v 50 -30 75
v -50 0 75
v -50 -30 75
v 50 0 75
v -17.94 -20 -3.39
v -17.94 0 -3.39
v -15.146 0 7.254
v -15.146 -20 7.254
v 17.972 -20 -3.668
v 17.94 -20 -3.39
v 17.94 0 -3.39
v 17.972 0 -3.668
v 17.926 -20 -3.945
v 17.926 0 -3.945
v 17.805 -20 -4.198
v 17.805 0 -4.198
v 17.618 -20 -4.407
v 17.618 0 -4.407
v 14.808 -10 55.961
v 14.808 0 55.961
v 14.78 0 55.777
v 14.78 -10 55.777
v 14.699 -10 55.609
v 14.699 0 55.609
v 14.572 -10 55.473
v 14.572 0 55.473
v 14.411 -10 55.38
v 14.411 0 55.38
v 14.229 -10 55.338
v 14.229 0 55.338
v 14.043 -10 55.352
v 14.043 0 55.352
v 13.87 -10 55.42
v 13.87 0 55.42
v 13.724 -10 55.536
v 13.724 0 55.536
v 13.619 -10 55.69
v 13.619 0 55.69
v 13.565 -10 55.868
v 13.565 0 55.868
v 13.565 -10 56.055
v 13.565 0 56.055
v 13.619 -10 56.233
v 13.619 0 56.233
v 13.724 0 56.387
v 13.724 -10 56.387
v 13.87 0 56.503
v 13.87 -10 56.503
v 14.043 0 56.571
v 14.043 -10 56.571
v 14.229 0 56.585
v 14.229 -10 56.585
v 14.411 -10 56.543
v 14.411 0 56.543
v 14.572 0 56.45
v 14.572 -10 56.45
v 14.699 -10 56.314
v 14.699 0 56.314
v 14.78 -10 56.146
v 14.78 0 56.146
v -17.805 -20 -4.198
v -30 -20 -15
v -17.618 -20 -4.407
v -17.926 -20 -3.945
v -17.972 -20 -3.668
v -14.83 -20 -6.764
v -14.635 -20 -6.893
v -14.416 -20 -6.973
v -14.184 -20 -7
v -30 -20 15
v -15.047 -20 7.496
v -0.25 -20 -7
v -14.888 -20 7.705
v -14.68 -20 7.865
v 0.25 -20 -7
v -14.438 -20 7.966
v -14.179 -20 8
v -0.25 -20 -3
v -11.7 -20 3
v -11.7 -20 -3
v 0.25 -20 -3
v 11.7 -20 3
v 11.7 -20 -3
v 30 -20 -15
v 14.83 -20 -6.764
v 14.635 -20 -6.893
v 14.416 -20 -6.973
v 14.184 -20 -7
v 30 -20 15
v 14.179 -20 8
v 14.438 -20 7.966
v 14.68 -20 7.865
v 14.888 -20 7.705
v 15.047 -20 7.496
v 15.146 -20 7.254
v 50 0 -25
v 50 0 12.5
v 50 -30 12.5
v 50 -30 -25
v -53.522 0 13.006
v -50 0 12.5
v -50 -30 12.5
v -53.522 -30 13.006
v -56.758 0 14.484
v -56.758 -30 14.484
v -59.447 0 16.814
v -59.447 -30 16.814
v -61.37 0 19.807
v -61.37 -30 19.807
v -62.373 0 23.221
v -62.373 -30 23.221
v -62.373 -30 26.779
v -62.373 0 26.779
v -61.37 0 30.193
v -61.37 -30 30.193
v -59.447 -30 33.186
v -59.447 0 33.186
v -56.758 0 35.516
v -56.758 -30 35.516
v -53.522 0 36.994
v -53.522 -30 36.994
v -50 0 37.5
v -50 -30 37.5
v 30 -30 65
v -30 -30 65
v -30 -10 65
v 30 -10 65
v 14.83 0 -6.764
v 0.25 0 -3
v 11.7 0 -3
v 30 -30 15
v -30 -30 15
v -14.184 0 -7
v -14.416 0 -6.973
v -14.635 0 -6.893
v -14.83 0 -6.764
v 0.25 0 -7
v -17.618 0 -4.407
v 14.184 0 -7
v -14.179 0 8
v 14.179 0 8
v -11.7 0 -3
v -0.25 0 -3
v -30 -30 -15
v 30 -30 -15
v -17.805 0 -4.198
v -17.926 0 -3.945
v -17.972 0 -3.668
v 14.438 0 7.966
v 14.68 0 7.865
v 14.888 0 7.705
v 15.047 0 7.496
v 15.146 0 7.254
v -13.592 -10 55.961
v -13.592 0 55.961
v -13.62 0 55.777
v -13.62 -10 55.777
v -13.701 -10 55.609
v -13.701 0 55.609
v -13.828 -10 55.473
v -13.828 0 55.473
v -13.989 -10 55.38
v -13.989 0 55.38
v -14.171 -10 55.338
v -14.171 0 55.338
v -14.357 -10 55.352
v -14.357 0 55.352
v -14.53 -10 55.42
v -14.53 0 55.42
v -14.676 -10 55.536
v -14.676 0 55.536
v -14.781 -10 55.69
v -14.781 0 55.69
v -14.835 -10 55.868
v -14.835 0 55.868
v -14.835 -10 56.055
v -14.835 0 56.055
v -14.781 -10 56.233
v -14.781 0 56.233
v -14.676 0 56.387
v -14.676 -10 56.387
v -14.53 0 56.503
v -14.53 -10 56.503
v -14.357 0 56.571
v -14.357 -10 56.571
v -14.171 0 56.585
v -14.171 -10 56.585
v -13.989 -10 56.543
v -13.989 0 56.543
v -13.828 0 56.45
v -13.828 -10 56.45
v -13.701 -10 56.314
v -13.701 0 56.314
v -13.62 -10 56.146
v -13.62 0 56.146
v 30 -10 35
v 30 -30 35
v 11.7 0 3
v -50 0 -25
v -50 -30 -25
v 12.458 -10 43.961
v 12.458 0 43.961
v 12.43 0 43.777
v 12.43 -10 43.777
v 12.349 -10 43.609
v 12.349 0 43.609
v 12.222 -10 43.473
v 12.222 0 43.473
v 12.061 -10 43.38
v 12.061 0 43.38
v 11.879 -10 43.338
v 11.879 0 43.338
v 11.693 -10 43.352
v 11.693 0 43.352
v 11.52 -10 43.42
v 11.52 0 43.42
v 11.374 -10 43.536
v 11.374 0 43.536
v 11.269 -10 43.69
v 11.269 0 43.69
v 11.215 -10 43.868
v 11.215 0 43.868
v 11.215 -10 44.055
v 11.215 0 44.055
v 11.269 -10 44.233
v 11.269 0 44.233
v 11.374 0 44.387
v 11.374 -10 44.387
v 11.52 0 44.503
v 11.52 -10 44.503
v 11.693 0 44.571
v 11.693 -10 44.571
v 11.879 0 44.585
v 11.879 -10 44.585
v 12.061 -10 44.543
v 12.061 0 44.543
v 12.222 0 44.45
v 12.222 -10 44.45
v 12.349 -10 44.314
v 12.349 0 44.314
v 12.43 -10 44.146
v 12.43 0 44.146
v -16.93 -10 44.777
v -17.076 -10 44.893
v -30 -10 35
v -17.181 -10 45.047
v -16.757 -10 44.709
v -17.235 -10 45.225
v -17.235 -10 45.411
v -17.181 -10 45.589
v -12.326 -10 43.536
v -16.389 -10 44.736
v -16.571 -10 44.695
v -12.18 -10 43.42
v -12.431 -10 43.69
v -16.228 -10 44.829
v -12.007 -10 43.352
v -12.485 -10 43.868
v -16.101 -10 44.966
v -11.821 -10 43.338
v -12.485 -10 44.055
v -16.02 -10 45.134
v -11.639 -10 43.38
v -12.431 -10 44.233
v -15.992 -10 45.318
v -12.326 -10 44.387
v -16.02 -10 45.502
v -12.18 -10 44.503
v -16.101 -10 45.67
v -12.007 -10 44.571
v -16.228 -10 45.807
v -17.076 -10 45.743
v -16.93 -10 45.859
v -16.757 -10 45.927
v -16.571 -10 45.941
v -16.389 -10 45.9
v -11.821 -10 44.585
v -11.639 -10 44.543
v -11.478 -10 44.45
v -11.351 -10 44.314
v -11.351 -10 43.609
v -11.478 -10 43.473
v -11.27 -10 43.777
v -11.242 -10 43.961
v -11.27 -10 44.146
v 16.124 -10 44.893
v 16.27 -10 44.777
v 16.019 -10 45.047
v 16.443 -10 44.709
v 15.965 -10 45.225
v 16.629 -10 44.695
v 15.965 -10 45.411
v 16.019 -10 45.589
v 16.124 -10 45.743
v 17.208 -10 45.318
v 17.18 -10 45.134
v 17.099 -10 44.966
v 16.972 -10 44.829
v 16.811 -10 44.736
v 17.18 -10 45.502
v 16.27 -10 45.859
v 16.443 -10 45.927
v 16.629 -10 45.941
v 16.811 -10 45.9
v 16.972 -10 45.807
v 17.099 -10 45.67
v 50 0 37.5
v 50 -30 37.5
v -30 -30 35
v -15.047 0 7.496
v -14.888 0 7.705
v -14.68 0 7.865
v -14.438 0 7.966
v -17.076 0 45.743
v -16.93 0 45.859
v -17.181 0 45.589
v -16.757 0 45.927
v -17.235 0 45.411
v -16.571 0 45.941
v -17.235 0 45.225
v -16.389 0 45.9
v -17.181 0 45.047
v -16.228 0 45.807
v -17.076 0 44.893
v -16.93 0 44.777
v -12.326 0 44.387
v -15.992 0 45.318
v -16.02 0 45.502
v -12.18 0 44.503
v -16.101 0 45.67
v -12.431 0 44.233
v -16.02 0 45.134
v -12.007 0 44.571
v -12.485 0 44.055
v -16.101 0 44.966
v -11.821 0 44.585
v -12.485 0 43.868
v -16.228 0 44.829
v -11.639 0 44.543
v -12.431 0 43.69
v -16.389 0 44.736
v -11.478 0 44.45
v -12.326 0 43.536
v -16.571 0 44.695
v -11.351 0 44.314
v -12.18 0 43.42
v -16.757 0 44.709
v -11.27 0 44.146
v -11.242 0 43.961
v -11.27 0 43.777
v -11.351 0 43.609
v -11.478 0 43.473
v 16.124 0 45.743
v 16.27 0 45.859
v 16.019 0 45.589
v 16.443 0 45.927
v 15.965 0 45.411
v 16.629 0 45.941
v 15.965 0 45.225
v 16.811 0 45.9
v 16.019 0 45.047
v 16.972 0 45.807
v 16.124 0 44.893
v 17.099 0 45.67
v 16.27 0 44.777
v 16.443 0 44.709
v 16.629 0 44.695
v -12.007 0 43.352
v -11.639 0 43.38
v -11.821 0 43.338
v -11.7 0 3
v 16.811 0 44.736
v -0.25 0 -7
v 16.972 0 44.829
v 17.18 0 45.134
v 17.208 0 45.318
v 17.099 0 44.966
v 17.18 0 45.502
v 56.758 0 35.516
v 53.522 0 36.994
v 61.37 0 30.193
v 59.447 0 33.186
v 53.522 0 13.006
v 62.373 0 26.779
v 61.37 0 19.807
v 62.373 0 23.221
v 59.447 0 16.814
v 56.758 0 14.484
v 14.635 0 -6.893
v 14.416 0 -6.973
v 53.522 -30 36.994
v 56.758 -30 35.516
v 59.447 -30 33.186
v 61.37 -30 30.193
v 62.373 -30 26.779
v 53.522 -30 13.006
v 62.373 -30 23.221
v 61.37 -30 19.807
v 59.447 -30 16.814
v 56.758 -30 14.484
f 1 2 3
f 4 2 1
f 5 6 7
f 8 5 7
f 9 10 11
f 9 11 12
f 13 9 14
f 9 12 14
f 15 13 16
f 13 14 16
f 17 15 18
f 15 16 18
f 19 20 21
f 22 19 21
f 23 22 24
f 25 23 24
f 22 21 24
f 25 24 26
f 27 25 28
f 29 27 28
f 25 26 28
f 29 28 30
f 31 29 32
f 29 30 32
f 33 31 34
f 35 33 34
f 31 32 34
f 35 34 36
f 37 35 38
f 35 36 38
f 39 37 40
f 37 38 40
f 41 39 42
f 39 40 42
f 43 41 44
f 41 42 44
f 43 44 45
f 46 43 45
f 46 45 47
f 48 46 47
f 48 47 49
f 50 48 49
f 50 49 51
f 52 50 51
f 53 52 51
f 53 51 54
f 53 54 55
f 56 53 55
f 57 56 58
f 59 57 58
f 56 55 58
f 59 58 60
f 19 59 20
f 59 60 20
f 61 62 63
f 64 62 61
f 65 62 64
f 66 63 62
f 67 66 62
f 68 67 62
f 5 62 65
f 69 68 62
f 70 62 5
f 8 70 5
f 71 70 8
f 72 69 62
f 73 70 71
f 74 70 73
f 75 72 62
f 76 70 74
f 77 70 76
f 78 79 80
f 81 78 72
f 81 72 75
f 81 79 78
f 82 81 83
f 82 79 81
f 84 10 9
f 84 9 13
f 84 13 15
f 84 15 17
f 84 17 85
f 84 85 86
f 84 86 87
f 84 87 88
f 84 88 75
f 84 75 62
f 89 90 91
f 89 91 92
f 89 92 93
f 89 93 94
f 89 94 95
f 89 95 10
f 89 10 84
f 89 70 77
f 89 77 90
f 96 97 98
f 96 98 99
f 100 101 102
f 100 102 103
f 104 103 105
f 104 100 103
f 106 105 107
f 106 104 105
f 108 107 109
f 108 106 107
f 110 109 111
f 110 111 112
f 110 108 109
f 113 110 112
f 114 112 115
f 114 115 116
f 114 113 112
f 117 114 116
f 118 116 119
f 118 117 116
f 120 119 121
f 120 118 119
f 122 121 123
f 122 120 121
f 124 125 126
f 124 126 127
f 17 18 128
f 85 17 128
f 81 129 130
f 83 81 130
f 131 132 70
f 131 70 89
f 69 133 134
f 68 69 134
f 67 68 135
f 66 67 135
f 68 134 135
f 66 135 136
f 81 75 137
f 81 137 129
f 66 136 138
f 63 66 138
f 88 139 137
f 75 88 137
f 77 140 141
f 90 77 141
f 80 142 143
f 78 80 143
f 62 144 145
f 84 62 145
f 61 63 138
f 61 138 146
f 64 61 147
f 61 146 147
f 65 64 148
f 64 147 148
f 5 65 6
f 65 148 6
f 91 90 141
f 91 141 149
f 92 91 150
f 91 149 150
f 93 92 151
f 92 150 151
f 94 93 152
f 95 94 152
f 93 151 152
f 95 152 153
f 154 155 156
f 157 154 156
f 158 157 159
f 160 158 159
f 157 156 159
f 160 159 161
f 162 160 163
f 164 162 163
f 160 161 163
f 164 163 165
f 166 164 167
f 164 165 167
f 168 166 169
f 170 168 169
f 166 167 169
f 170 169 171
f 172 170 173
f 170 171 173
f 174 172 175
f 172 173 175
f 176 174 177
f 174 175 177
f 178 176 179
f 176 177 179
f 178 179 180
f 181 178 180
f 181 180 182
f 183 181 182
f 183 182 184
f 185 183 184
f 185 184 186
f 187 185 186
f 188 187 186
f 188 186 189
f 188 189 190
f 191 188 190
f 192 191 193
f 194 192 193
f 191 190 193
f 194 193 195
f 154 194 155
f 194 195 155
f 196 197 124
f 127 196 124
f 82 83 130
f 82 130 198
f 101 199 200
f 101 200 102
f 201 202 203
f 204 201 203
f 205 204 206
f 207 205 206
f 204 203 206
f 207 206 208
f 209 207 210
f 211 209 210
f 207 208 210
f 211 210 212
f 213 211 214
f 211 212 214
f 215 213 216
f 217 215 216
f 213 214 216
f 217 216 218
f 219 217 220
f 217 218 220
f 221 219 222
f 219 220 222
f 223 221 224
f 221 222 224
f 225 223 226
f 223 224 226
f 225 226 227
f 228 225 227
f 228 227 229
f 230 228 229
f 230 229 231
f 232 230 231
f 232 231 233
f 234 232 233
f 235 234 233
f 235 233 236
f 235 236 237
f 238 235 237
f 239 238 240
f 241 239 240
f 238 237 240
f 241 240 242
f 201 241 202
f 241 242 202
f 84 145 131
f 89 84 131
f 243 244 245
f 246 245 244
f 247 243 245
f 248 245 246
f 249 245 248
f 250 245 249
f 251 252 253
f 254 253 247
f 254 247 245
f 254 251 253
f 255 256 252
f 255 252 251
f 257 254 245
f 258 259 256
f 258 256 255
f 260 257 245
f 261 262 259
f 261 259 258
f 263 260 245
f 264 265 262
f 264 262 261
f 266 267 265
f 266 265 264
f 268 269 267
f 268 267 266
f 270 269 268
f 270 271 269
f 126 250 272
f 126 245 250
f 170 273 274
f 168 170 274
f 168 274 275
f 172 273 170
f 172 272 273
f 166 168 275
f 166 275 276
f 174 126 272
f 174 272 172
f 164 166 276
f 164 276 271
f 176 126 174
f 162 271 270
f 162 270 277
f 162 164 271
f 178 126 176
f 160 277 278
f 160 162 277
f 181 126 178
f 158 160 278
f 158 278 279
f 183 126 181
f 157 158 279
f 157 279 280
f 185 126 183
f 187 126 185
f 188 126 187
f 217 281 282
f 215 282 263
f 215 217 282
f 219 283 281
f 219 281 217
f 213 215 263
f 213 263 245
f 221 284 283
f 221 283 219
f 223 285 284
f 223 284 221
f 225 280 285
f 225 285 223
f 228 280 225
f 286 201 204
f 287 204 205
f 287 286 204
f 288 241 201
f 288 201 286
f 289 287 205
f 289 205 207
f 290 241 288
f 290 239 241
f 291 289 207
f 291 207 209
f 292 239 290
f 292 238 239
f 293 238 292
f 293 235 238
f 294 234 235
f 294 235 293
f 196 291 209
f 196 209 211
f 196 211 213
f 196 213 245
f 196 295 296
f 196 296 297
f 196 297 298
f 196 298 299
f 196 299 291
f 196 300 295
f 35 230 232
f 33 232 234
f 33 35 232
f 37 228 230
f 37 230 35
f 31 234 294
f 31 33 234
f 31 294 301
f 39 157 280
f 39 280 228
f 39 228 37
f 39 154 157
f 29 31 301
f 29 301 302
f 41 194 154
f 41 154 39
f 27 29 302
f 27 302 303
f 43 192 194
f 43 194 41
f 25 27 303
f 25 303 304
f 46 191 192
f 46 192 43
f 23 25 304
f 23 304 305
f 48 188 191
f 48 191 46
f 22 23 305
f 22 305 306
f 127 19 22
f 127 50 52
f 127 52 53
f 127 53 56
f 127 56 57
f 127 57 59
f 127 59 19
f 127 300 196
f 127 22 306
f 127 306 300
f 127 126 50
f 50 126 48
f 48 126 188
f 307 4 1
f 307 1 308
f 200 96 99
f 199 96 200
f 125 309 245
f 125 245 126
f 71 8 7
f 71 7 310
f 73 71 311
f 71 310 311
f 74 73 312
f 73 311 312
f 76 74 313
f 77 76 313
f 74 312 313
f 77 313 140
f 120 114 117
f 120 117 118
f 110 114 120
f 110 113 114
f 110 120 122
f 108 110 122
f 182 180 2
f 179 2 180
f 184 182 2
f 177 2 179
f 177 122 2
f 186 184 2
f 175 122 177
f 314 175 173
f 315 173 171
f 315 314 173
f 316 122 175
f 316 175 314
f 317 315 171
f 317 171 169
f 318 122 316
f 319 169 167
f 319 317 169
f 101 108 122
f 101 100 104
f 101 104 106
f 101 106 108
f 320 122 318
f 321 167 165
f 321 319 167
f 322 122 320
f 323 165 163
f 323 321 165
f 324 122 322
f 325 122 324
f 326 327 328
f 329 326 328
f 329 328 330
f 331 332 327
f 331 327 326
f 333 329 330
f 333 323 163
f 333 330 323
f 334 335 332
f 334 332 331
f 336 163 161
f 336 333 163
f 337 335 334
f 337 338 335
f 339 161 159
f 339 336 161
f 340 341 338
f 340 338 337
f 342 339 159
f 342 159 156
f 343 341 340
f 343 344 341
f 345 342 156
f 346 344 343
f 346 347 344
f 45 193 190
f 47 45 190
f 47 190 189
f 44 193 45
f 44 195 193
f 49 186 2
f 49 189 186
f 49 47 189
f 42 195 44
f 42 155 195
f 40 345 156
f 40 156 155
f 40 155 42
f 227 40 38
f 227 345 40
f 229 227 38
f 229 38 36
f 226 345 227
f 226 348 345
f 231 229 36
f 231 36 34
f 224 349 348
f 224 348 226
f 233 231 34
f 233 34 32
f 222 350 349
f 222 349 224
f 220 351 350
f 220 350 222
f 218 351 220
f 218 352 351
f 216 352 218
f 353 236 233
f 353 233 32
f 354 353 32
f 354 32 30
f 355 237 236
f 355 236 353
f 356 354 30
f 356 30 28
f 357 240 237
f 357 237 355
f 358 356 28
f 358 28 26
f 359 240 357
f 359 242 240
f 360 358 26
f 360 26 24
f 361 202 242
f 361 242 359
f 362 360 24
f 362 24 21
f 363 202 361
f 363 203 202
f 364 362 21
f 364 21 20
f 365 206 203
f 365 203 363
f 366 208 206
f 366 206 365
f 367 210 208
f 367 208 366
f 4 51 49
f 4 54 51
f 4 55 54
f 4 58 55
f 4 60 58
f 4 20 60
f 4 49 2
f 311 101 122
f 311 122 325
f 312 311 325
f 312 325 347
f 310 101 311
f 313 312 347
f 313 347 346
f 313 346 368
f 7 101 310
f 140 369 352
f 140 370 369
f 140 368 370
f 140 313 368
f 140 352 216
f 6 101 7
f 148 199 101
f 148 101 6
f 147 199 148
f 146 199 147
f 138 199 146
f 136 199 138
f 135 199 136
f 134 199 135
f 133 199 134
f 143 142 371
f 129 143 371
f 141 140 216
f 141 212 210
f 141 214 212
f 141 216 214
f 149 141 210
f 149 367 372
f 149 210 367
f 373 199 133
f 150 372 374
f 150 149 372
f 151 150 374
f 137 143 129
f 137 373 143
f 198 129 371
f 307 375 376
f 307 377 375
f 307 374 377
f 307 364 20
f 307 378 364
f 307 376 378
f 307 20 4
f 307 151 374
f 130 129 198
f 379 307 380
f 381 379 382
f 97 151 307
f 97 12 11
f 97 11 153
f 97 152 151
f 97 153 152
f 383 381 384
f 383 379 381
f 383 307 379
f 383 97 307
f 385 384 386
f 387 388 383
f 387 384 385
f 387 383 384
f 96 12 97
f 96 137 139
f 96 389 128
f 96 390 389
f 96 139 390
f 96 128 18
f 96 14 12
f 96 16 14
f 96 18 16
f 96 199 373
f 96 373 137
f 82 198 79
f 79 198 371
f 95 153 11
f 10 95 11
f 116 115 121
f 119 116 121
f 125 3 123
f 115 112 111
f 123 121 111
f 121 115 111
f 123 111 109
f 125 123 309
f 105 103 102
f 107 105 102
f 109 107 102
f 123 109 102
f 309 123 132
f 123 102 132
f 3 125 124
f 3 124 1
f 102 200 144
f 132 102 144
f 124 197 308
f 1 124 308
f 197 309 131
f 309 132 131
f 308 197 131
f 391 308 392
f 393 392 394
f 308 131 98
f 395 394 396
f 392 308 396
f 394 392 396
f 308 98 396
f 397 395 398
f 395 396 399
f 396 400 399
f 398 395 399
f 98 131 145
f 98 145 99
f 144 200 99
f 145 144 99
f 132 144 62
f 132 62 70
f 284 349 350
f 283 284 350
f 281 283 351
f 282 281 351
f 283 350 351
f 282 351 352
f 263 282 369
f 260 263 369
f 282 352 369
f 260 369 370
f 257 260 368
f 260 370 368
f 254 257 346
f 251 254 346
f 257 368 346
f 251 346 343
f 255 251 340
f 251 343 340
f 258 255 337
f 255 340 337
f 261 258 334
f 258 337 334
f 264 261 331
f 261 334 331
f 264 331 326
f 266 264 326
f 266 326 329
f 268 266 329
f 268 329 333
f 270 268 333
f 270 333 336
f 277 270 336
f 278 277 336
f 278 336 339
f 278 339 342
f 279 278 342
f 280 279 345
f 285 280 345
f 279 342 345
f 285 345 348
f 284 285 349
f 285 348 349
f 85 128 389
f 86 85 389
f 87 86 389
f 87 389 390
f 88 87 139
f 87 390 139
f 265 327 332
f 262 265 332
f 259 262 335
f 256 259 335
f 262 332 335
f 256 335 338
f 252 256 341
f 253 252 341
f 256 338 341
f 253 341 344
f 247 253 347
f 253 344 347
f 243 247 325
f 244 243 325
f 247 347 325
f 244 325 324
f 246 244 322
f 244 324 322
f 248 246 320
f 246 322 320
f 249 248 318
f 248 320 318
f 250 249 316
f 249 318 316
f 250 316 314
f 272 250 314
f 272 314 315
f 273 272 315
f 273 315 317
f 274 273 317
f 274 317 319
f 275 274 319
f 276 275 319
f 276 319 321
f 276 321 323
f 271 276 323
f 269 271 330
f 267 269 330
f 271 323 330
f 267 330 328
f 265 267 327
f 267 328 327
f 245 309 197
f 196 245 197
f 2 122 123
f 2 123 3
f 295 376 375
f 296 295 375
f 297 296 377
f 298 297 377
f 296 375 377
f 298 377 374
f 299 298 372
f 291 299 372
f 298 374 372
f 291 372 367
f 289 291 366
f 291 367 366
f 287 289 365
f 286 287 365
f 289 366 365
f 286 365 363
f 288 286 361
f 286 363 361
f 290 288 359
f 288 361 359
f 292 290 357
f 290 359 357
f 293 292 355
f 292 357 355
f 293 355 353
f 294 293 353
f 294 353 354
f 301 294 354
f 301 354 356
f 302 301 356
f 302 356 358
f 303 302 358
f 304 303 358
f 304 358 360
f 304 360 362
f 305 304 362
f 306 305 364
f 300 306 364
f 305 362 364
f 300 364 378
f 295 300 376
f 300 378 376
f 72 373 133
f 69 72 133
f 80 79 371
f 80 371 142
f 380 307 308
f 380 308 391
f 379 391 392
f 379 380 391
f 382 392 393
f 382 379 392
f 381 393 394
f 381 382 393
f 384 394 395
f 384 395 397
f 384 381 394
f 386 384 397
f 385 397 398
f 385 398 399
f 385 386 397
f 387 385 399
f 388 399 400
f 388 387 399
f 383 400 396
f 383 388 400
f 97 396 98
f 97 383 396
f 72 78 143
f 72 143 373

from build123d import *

# Parameters (mm, degrees)
BOSS_EXTRUDE1_DEPTH = 30
CUT_EXTRUDE2_DEPTH  = 20
SKETCH3_R           = 0.625
CUT_EXTRUDE3_DEPTH  = 10
SKETCH4_W           = 60
SKETCH4_H           = 30
CUT_EXTRUDE4_DEPTH  = 10
SKETCH5_W           = 60
SKETCH5_H           = 30
CUT_EXTRUDE5_DEPTH  = 20


with BuildPart() as part:
    # Sketch2 → Boss-Extrude1 (new body)
    with BuildSketch(Plane(origin=(0, 0, 0), x_dir=(1, 0, 0), z_dir=(0, 1, 0))):
        with BuildLine():
            Line((-50, -75), (50, -75))
            Line((50, -75), (50, -37.5))
            ThreePointArc((50, -37.5), (62.5, -25), (50, -12.5))
            Line((50, -12.5), (50, 25))
            Line((50, 25), (-50, 25))
            Line((-50, 25), (-50, -12.5))
            ThreePointArc((-50, -12.5), (-62.5, -25), (-50, -37.5))
            Line((-50, -37.5), (-50, -75))
        make_face()
    extrude(amount=-BOSS_EXTRUDE1_DEPTH)

    # Sketch1 → Cut-Extrude2 (cut)
    with BuildSketch(Plane(origin=(0, 0, 0), x_dir=(1, 0, 0), z_dir=(0, 1, 0))):
        with BuildLine():
            Line((-14.178620776, -8), (14.178620776, -8))
            ThreePointArc((14.178620776, -8), (14.789399734, -7.791801152), (15.145851741, -7.253898128))
            Line((15.145851741, -7.253898128), (17.939776994, 3.389626646))
            ThreePointArc((17.939776994, 3.389626646), (17.926022481, 3.944992277), (17.618005902, 4.407318956))
            Line((17.618005902, 4.407318956), (14.829510217, 6.763794182))
            ThreePointArc((14.829510217, 6.763794182), (14.527711383, 6.939093761), (14.184050345, 7))
            Line((14.184050345, 7), (0.25, 7))
            Line((0.25, 7), (0.25, 3))
            Line((0.25, 3), (11.7, 3))
            Line((11.7, 3), (11.7, -3))
            Line((11.7, -3), (-11.7, -3))
            Line((-11.7, -3), (-11.7, 3))
            Line((-11.7, 3), (-0.25, 3))
            Line((-0.25, 3), (-0.25, 7))
            Line((-0.25, 7), (-14.184050345, 7))
            ThreePointArc((-14.184050345, 7), (-14.527711383, 6.939093761), (-14.829510217, 6.763794182))
            Line((-14.829510217, 6.763794182), (-17.618005902, 4.407318956))
            ThreePointArc((-17.618005902, 4.407318956), (-17.926022481, 3.944992277), (-17.939776994, 3.389626646))
            Line((-17.939776994, 3.389626646), (-15.145851741, -7.253898128))
            ThreePointArc((-15.145851741, -7.253898128), (-14.789399734, -7.791801152), (-14.178620776, -8))
        make_face()
    extrude(amount=-CUT_EXTRUDE2_DEPTH, mode=Mode.SUBTRACT)

    # Sketch3 → Cut-Extrude3 (cut)
    with BuildSketch(Plane(origin=(0, 0, 0), x_dir=(1, 0, 0), z_dir=(0, 1, 0))):
        with Locations((-14.217473576, -55.961496156)):
            Circle(SKETCH3_R)
        with Locations((14.182526424, -55.961496156)):
            Circle(SKETCH3_R)
        with Locations((-16.617473576, -45.317971382)):
            Circle(SKETCH3_R)
        with Locations((16.582526424, -45.317971382)):
            Circle(SKETCH3_R)
        with Locations((-11.867473576, -43.961496156)):
            Circle(SKETCH3_R)
        with Locations((11.832526424, -43.961496156)):
            Circle(SKETCH3_R)
    extrude(amount=-CUT_EXTRUDE3_DEPTH, mode=Mode.SUBTRACT)

    # Sketch4 → Cut-Extrude4 (cut)
    with BuildSketch(Plane.XZ.offset(30)):
        Rectangle(SKETCH4_W, SKETCH4_H)
    extrude(amount=-CUT_EXTRUDE4_DEPTH, mode=Mode.SUBTRACT)

    # Sketch5 → Cut-Extrude5 (cut)
    with BuildSketch(Plane.XZ.offset(30)):
        with Locations((0, 50)):
            Rectangle(SKETCH5_W, SKETCH5_H)
    extrude(amount=-CUT_EXTRUDE5_DEPTH, mode=Mode.SUBTRACT)


solid = part.part
